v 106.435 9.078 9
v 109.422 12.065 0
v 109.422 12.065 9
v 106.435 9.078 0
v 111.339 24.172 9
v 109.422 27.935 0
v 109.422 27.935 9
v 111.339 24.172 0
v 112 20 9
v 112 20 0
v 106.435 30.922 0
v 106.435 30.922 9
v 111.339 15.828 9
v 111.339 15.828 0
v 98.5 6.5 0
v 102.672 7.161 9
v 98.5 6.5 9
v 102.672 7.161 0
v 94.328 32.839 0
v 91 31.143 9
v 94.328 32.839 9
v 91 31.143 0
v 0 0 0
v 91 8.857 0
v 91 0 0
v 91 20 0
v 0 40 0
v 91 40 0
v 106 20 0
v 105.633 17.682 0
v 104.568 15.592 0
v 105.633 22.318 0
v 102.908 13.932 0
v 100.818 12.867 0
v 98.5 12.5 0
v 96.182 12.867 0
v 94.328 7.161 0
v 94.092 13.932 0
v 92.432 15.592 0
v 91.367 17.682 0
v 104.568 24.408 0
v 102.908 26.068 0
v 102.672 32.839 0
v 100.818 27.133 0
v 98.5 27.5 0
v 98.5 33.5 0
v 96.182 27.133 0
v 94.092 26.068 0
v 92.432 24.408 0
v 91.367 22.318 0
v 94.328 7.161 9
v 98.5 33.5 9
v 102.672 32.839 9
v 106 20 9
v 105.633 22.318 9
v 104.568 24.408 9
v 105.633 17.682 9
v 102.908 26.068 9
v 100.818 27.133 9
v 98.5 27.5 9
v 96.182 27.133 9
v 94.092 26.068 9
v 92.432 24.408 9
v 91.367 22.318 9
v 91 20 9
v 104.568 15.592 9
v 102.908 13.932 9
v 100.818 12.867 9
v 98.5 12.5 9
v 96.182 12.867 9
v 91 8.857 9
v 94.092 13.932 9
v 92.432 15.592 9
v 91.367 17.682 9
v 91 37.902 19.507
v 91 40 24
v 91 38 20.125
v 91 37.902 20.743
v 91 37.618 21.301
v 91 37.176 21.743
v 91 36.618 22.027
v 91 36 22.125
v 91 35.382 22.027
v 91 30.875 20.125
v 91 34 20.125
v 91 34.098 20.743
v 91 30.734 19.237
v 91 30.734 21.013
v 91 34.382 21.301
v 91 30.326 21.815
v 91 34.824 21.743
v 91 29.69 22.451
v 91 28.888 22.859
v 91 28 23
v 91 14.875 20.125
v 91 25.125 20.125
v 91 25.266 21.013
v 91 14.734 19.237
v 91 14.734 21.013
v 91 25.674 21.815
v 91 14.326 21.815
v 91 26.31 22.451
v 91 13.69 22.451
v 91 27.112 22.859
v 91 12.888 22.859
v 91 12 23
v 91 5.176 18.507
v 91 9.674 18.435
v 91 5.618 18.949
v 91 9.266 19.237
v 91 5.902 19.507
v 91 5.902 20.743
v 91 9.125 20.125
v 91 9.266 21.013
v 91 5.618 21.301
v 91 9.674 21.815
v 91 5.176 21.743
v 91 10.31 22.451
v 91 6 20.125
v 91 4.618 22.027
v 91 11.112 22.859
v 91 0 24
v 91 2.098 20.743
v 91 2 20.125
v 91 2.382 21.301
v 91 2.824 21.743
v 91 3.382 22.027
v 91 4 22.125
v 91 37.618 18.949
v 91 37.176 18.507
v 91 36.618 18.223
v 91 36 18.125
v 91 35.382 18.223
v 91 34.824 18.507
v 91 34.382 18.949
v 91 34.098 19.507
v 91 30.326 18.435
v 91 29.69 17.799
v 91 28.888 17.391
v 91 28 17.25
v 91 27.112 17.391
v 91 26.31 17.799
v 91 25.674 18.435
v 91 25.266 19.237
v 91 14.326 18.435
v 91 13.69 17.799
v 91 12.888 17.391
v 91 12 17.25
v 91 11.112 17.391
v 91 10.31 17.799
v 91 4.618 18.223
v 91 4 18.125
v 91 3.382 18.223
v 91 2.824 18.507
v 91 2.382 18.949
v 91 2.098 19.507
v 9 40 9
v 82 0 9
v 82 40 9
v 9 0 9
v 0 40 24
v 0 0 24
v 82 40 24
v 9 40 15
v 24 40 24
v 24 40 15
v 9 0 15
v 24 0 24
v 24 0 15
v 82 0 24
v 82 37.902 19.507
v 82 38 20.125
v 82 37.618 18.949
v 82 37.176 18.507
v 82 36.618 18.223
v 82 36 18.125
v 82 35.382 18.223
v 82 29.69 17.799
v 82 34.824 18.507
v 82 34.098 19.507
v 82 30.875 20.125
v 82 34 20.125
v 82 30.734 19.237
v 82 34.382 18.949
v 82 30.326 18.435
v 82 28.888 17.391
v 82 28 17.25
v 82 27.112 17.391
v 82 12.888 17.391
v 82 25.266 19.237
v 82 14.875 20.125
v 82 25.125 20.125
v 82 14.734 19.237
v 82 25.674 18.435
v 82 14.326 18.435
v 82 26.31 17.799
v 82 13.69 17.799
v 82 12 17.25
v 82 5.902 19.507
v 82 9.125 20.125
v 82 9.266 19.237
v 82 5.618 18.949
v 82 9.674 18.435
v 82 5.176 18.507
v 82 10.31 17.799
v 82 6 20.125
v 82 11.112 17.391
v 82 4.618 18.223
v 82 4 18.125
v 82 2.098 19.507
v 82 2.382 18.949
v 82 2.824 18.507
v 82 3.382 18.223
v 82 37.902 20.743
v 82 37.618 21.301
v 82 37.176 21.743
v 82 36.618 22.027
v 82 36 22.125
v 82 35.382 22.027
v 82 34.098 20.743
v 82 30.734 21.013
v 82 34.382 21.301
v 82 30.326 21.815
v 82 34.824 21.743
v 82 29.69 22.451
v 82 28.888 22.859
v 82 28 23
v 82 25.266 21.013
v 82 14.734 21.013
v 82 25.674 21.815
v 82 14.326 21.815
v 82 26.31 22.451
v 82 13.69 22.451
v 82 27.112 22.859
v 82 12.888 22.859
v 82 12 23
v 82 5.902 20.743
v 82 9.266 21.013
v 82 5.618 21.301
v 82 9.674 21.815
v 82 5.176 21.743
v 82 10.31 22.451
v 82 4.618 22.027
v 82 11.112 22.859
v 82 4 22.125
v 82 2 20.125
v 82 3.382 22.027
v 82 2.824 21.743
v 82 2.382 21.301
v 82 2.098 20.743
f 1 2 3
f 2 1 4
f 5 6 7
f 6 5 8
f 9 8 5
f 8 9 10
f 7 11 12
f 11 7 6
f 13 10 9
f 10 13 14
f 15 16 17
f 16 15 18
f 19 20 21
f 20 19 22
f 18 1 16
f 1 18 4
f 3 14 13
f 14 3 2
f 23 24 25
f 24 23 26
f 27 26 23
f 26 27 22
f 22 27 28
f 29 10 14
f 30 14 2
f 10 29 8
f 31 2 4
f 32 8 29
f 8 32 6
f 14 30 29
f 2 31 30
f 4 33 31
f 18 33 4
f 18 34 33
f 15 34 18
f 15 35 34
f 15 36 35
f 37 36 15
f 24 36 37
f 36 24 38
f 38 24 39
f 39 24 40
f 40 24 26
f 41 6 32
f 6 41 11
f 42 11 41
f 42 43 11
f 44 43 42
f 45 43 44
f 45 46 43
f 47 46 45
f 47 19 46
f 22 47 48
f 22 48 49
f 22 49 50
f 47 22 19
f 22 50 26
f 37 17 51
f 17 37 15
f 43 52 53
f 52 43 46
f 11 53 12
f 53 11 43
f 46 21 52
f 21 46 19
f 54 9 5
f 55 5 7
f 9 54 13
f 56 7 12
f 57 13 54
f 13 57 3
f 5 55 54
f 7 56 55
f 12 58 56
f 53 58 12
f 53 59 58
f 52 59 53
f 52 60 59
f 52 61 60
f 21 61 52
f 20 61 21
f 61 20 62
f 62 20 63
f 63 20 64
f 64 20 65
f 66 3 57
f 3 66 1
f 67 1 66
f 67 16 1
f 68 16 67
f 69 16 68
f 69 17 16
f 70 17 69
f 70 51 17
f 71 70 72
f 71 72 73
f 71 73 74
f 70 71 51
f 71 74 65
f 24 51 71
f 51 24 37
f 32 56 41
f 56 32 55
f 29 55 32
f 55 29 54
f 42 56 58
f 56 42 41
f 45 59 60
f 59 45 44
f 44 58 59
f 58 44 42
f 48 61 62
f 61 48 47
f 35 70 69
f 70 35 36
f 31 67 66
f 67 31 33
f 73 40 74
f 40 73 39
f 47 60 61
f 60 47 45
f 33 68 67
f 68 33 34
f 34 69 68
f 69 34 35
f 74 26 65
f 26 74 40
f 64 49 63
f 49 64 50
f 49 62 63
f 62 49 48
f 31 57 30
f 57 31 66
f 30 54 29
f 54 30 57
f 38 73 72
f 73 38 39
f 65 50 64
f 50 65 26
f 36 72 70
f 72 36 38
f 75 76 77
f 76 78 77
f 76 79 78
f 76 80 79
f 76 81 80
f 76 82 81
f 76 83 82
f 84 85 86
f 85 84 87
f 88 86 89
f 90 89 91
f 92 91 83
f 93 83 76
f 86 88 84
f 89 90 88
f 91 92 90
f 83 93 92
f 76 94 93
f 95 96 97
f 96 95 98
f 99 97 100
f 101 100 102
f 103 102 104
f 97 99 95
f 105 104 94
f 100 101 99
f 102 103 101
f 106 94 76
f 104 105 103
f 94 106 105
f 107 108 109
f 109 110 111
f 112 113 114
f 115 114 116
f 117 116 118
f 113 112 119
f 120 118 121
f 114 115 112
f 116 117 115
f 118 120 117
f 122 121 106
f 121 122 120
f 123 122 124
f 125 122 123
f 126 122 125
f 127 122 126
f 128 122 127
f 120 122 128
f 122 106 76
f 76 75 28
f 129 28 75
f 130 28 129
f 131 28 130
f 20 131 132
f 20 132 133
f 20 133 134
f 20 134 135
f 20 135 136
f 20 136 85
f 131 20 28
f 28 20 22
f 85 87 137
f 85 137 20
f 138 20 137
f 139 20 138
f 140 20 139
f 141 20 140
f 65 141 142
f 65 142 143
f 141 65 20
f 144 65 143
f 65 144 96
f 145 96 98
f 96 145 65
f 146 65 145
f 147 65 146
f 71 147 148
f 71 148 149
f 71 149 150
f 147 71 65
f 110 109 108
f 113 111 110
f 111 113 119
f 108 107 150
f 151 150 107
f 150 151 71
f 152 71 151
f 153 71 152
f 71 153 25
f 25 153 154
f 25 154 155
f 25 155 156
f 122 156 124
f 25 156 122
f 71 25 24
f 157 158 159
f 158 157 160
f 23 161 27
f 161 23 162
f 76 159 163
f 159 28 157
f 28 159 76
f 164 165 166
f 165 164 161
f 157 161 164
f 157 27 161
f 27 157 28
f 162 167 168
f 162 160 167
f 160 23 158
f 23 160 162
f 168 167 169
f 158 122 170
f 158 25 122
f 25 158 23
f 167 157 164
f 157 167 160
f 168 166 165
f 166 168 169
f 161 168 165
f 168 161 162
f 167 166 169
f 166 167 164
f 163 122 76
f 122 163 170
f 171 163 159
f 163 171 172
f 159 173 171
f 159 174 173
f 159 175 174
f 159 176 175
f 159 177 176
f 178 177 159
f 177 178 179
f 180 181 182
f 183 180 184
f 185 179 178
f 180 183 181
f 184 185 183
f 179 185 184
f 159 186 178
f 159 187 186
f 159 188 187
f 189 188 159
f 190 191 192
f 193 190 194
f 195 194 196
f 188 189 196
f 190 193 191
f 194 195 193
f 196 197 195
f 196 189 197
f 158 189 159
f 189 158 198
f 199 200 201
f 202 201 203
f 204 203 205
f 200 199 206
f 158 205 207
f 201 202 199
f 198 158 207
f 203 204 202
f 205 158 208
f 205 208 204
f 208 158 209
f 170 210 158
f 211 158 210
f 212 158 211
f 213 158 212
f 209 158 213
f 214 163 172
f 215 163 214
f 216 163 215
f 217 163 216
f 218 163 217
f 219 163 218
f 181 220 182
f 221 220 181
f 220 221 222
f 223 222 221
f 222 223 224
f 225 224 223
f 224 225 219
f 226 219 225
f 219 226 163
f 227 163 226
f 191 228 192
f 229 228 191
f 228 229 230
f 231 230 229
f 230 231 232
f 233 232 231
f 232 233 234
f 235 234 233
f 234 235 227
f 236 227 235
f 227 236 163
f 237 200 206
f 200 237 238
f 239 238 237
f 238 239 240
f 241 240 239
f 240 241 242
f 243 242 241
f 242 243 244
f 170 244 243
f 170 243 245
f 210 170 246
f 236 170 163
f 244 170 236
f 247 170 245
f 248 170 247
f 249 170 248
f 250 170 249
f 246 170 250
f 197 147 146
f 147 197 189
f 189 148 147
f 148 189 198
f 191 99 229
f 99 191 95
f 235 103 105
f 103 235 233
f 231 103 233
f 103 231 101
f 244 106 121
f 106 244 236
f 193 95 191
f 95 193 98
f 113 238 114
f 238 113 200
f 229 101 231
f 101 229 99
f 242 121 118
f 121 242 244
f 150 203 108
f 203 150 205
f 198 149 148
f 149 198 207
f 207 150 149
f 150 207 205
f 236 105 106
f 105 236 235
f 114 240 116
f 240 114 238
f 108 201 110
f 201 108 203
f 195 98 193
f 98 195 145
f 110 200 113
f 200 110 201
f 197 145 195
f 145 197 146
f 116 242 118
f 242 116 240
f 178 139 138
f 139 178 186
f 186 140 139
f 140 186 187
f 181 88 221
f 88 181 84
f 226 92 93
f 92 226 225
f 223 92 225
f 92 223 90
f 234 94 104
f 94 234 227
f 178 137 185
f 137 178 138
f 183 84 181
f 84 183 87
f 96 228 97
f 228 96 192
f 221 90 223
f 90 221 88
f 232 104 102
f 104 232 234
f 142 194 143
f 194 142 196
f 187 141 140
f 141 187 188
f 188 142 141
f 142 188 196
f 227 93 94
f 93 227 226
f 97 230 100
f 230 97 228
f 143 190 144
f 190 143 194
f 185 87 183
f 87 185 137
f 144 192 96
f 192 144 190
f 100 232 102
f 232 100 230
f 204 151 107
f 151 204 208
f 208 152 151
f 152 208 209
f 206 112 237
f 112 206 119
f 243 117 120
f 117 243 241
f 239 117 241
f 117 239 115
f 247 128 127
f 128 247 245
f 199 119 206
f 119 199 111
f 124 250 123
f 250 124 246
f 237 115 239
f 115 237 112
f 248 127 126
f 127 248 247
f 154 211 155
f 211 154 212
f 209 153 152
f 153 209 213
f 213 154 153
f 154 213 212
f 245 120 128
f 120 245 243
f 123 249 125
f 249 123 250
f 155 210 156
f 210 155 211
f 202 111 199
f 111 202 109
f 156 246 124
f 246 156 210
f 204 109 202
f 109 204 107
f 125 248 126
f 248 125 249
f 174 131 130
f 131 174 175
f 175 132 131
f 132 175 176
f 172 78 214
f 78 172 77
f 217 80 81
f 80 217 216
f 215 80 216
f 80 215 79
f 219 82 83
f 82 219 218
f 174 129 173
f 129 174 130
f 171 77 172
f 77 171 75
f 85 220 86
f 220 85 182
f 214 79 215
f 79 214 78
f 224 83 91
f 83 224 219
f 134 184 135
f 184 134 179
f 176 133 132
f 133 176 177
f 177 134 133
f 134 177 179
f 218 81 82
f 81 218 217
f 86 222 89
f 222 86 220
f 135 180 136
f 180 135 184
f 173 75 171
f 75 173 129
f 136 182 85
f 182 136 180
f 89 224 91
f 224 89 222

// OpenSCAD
stepover_thickness = 9.00;
rear_clamp_depth = 15.00;
rear_clamp_thickness = 9.00;
slideover_gap = 58.00;
outer_plate_thickness = 9.00;
siding_thickness = 6.00;
height = 40.00;
bolt_diameter = 5.75;
bolt_position_y = 0.3;
bolt_top_margin = 1.0;
locator_hole_diameter = 4.0;
locator_hole_position_y = 0.1;
eyelet_inner_diameter = 15.00;
eyelet_wall_thickness = 6.00;

eps=0.001;

$fn=20;

module main_clamp_positive() {
    cube([2*stepover_thickness + rear_clamp_depth + slideover_gap, height, outer_plate_thickness]);
    translate([0.0, 0.0, outer_plate_thickness - eps])
        cube([stepover_thickness, height, siding_thickness + 2*eps]);
    translate([0.0, 0.0, outer_plate_thickness + siding_thickness])
        cube([stepover_thickness + rear_clamp_depth, height, rear_clamp_thickness]);
        
        translate([stepover_thickness + rear_clamp_depth + slideover_gap, 0.0, outer_plate_thickness - eps])
            cube([stepover_thickness, height, siding_thickness + rear_clamp_thickness + eps]);
    
    // Eyelet
    translate([2*stepover_thickness + rear_clamp_depth + slideover_gap + 0.5*eyelet_inner_diameter, 0.5*height, 0.0])
    difference() {
        cylinder(d=(eyelet_inner_diameter + 2*eyelet_wall_thickness), h=outer_plate_thickness);
        translate([0.0, 0.0, -eps])
        cylinder(d=eyelet_inner_diameter, h=outer_plate_thickness + 2*eps);
    }
}        
 
module bolt_holes() {
        translate([stepover_thickness + rear_clamp_depth + slideover_gap - eps, 0.0, outer_plate_thickness + siding_thickness + rear_clamp_thickness - 0.5*bolt_diameter - bolt_top_margin])
    rotate([0.0, 90.0, 0.0]) {
        translate([0.0, bolt_position_y*height]) {
            cylinder(d=bolt_diameter, h=stepover_thickness+2*eps);
        }
        
        translate([0.0, (1.0 - bolt_position_y)*height]) {
            cylinder(d=bolt_diameter, h=stepover_thickness+2*eps);
        }
        
       // Locator holes
       translate([0.0, locator_hole_position_y*height]) {
            cylinder(d=locator_hole_diameter, h=stepover_thickness+2*eps);
        }
       translate([0.0, (1.0 - locator_hole_position_y)*height]) {
            cylinder(d=locator_hole_diameter, h=stepover_thickness+2*eps);
        }
    }
}

difference() {
    main_clamp_positive();
    bolt_holes();
}
